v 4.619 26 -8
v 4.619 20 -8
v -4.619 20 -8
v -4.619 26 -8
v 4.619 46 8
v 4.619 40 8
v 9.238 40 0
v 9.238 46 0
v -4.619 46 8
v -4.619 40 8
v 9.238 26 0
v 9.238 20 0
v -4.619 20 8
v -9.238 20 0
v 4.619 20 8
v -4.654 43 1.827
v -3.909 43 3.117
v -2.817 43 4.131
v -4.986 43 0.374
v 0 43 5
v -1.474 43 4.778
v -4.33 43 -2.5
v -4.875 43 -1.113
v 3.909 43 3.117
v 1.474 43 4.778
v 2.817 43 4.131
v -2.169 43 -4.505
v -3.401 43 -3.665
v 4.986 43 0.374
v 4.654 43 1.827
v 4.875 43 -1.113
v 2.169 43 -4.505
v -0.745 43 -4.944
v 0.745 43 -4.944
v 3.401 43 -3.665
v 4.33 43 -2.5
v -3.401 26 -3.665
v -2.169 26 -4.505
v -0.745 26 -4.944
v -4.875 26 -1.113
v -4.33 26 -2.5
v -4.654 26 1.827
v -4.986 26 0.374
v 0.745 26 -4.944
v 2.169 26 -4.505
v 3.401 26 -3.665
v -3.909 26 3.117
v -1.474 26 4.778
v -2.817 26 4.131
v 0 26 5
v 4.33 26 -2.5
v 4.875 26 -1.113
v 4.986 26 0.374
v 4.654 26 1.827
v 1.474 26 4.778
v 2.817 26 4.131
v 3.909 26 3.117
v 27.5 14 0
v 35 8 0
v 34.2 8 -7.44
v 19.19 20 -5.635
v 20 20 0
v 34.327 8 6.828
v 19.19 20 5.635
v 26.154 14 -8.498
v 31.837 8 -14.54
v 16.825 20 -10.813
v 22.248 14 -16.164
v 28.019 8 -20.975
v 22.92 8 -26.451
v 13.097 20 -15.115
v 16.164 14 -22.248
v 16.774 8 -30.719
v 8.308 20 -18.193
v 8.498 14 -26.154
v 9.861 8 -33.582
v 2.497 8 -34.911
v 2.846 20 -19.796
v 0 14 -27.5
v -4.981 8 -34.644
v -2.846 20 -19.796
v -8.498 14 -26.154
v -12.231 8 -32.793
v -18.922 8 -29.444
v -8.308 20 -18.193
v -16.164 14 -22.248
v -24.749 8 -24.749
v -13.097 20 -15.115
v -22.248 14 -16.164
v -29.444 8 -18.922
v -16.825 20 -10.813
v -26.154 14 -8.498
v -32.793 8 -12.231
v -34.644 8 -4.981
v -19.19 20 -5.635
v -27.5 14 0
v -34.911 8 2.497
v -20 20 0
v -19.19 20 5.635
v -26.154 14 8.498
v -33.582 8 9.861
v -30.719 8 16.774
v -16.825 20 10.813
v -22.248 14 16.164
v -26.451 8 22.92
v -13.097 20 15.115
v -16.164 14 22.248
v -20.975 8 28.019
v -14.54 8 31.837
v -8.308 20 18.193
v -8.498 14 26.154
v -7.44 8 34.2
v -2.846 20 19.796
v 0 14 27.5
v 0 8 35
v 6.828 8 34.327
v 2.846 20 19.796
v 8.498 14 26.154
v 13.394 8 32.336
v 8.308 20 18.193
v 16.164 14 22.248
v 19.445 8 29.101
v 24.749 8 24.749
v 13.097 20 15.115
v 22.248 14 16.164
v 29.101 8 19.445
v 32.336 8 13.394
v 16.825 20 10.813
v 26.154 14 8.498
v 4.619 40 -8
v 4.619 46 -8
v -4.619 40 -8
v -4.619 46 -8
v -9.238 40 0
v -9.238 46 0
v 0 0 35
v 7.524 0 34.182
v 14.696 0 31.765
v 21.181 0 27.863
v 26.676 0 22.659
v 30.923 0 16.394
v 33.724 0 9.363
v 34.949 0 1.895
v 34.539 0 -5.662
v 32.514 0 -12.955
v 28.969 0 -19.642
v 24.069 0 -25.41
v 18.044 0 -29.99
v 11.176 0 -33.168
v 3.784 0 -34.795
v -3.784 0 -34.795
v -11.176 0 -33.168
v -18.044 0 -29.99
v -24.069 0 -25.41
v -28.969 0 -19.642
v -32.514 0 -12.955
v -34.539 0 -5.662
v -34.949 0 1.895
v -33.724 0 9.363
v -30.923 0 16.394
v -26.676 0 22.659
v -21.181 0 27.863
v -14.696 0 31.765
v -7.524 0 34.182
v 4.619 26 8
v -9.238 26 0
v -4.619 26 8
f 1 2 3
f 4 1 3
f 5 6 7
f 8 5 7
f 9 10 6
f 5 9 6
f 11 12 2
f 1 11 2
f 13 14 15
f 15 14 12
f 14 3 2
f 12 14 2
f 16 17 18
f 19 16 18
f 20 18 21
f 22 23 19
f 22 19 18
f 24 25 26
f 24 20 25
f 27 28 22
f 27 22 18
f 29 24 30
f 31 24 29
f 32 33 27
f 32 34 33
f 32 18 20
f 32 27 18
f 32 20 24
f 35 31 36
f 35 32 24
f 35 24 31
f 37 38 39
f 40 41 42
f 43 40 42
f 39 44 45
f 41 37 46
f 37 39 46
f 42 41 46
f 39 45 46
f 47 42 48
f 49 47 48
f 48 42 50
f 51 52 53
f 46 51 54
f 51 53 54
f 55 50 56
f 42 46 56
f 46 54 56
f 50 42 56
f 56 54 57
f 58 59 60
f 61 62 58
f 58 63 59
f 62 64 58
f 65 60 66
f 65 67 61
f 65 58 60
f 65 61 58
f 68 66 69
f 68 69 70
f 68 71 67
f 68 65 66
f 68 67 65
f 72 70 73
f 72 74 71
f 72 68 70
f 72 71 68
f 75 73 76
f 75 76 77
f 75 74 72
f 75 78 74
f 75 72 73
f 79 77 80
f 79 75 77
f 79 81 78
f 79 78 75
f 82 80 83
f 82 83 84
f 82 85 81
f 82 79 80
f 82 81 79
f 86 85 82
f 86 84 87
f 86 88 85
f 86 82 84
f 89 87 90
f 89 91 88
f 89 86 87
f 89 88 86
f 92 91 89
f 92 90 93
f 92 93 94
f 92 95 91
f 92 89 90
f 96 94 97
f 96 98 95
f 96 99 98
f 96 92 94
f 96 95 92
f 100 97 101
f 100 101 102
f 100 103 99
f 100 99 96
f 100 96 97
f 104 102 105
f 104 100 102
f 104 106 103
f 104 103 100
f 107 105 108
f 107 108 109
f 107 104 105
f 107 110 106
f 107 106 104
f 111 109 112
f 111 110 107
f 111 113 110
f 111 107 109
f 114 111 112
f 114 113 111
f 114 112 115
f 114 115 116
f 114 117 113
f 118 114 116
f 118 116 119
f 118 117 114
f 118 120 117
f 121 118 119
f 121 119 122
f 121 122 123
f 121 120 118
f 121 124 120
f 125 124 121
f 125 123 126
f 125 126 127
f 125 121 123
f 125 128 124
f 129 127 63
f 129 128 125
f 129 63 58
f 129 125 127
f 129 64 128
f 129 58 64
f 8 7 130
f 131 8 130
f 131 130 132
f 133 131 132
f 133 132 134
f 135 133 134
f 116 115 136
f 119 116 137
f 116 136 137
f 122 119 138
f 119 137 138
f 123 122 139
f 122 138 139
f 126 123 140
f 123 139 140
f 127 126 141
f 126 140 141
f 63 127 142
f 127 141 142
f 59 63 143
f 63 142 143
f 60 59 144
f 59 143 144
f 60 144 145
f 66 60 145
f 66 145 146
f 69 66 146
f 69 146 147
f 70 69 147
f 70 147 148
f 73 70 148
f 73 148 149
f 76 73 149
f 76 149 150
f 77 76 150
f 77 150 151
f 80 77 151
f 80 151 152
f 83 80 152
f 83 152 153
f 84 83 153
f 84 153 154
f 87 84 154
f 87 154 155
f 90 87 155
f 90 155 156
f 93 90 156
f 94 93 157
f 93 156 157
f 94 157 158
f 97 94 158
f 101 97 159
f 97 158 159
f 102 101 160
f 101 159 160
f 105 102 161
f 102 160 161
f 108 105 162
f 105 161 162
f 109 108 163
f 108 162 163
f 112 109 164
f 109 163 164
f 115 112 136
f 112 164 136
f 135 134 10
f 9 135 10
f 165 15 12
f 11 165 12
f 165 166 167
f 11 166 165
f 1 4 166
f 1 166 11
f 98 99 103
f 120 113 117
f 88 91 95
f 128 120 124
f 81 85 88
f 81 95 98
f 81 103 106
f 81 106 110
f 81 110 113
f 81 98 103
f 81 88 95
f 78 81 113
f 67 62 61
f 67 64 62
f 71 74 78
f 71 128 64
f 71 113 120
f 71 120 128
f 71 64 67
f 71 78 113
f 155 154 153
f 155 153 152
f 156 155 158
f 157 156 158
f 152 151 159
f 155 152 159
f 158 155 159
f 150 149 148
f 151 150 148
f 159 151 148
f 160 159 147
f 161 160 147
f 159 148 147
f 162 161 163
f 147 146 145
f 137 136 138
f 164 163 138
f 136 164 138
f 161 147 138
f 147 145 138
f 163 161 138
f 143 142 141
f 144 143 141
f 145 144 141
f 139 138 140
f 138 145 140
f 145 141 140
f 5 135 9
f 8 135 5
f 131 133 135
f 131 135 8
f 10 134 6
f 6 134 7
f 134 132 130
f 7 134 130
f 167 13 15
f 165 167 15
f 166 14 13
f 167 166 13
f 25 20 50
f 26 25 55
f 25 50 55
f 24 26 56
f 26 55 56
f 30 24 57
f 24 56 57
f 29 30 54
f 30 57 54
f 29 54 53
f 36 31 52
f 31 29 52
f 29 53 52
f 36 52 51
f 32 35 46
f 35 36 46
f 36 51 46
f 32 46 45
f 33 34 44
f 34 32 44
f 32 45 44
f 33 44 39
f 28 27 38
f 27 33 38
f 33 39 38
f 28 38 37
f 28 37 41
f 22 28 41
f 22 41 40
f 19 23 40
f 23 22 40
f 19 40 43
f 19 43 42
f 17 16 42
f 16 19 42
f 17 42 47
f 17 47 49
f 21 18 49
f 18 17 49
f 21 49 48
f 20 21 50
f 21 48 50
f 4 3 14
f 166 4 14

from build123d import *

# Parameters (mm, degrees)
SKETCH_1_R               = 35
EXTRUDE_1_DEPTH          = 8
SKETCH_2_R               = 35
SKETCH_3_R               = 20
EXTRUDE_2_DEPTH          = 6
SKETCH_5_R               = 5
EXTRUDE_3_DEPTH          = 70
CHAMFER_1_SIZE           = 1
CUT_EXTRUDE_1_DEPTH      = 70
CUT_EXTRUDE_1_DEPTH_BACK = 70
SKETCH_6_W               = 71.147706593
SKETCH_6_H               = 64.013654713


with BuildPart() as part:
    # Эскиз1 → Бобышка-Вытянуть1 (new body)
    with BuildSketch(Plane(origin=(0, 0, 0), x_dir=(1, 0, 0), z_dir=(0, 1, 0))):
        with Locations(Location((0, 0, 0), (0, 0, 270))):
            Circle(SKETCH_1_R)
    extrude(amount=EXTRUDE_1_DEPTH)

    # Эскиз2 → По сечениям1 section 0
    with BuildSketch(Plane(origin=(0, 8, 0), x_dir=(1, 0, 0), z_dir=(0, 1, 0))):
        Circle(SKETCH_2_R)
    # Эскиз3 → По сечениям1 section 1
    with BuildSketch(Plane(origin=(0, 20, 0), x_dir=(1, 0, 0), z_dir=(0, 1, 0))):
        Circle(SKETCH_3_R)
    loft()


with BuildPart() as body_2:
    # Эскиз4 → Бобышка-Вытянуть2 (new body)
    with BuildSketch(Plane(origin=(0, 20, 0), x_dir=(1, 0, 0), z_dir=(0, 1, 0))):
        Polygon((9.237604307, 0), (4.618802154, 8), (-4.618802154, 8), (-9.237604307, 0), (-4.618802154, -8), (4.618802154, -8), align=None)
    extrude(amount=EXTRUDE_2_DEPTH)


with BuildPart() as body_3:
    # Эскиз5 → Бобышка-Вытянуть3 (new body)
    with BuildSketch(Plane(origin=(0, 26, 0), x_dir=(1, 0, 0), z_dir=(0, 1, 0))):
        with Locations(Location((0, 0, 0), (0, 0, 270))):
            Circle(SKETCH_5_R)
    extrude(amount=EXTRUDE_3_DEPTH)

    # Фаска1
    chamfer_1_edges = [body_3.edges().sort_by_distance(p)[0] for p in [
        (0, 96, -5),
    ]]
    chamfer(chamfer_1_edges, length=CHAMFER_1_SIZE)

    # Эскиз6 → Вырез-Вытянуть1 (cut, two sides: drawn at the far end of the back side and taken through both)
    with BuildSketch(Plane.XY.offset(-CUT_EXTRUDE_1_DEPTH_BACK)):
        with Locations((2.758972649, 75.006827356)):
            Rectangle(SKETCH_6_W, SKETCH_6_H)
    extrude(amount=CUT_EXTRUDE_1_DEPTH + CUT_EXTRUDE_1_DEPTH_BACK, mode=Mode.SUBTRACT)


with BuildPart() as body_4:
    # Move Body 1: copy of body 2
    add(body_2.part.moved(Location((0, 20, 0))))


solid = Compound([part.part, body_2.part, body_3.part, body_4.part])
